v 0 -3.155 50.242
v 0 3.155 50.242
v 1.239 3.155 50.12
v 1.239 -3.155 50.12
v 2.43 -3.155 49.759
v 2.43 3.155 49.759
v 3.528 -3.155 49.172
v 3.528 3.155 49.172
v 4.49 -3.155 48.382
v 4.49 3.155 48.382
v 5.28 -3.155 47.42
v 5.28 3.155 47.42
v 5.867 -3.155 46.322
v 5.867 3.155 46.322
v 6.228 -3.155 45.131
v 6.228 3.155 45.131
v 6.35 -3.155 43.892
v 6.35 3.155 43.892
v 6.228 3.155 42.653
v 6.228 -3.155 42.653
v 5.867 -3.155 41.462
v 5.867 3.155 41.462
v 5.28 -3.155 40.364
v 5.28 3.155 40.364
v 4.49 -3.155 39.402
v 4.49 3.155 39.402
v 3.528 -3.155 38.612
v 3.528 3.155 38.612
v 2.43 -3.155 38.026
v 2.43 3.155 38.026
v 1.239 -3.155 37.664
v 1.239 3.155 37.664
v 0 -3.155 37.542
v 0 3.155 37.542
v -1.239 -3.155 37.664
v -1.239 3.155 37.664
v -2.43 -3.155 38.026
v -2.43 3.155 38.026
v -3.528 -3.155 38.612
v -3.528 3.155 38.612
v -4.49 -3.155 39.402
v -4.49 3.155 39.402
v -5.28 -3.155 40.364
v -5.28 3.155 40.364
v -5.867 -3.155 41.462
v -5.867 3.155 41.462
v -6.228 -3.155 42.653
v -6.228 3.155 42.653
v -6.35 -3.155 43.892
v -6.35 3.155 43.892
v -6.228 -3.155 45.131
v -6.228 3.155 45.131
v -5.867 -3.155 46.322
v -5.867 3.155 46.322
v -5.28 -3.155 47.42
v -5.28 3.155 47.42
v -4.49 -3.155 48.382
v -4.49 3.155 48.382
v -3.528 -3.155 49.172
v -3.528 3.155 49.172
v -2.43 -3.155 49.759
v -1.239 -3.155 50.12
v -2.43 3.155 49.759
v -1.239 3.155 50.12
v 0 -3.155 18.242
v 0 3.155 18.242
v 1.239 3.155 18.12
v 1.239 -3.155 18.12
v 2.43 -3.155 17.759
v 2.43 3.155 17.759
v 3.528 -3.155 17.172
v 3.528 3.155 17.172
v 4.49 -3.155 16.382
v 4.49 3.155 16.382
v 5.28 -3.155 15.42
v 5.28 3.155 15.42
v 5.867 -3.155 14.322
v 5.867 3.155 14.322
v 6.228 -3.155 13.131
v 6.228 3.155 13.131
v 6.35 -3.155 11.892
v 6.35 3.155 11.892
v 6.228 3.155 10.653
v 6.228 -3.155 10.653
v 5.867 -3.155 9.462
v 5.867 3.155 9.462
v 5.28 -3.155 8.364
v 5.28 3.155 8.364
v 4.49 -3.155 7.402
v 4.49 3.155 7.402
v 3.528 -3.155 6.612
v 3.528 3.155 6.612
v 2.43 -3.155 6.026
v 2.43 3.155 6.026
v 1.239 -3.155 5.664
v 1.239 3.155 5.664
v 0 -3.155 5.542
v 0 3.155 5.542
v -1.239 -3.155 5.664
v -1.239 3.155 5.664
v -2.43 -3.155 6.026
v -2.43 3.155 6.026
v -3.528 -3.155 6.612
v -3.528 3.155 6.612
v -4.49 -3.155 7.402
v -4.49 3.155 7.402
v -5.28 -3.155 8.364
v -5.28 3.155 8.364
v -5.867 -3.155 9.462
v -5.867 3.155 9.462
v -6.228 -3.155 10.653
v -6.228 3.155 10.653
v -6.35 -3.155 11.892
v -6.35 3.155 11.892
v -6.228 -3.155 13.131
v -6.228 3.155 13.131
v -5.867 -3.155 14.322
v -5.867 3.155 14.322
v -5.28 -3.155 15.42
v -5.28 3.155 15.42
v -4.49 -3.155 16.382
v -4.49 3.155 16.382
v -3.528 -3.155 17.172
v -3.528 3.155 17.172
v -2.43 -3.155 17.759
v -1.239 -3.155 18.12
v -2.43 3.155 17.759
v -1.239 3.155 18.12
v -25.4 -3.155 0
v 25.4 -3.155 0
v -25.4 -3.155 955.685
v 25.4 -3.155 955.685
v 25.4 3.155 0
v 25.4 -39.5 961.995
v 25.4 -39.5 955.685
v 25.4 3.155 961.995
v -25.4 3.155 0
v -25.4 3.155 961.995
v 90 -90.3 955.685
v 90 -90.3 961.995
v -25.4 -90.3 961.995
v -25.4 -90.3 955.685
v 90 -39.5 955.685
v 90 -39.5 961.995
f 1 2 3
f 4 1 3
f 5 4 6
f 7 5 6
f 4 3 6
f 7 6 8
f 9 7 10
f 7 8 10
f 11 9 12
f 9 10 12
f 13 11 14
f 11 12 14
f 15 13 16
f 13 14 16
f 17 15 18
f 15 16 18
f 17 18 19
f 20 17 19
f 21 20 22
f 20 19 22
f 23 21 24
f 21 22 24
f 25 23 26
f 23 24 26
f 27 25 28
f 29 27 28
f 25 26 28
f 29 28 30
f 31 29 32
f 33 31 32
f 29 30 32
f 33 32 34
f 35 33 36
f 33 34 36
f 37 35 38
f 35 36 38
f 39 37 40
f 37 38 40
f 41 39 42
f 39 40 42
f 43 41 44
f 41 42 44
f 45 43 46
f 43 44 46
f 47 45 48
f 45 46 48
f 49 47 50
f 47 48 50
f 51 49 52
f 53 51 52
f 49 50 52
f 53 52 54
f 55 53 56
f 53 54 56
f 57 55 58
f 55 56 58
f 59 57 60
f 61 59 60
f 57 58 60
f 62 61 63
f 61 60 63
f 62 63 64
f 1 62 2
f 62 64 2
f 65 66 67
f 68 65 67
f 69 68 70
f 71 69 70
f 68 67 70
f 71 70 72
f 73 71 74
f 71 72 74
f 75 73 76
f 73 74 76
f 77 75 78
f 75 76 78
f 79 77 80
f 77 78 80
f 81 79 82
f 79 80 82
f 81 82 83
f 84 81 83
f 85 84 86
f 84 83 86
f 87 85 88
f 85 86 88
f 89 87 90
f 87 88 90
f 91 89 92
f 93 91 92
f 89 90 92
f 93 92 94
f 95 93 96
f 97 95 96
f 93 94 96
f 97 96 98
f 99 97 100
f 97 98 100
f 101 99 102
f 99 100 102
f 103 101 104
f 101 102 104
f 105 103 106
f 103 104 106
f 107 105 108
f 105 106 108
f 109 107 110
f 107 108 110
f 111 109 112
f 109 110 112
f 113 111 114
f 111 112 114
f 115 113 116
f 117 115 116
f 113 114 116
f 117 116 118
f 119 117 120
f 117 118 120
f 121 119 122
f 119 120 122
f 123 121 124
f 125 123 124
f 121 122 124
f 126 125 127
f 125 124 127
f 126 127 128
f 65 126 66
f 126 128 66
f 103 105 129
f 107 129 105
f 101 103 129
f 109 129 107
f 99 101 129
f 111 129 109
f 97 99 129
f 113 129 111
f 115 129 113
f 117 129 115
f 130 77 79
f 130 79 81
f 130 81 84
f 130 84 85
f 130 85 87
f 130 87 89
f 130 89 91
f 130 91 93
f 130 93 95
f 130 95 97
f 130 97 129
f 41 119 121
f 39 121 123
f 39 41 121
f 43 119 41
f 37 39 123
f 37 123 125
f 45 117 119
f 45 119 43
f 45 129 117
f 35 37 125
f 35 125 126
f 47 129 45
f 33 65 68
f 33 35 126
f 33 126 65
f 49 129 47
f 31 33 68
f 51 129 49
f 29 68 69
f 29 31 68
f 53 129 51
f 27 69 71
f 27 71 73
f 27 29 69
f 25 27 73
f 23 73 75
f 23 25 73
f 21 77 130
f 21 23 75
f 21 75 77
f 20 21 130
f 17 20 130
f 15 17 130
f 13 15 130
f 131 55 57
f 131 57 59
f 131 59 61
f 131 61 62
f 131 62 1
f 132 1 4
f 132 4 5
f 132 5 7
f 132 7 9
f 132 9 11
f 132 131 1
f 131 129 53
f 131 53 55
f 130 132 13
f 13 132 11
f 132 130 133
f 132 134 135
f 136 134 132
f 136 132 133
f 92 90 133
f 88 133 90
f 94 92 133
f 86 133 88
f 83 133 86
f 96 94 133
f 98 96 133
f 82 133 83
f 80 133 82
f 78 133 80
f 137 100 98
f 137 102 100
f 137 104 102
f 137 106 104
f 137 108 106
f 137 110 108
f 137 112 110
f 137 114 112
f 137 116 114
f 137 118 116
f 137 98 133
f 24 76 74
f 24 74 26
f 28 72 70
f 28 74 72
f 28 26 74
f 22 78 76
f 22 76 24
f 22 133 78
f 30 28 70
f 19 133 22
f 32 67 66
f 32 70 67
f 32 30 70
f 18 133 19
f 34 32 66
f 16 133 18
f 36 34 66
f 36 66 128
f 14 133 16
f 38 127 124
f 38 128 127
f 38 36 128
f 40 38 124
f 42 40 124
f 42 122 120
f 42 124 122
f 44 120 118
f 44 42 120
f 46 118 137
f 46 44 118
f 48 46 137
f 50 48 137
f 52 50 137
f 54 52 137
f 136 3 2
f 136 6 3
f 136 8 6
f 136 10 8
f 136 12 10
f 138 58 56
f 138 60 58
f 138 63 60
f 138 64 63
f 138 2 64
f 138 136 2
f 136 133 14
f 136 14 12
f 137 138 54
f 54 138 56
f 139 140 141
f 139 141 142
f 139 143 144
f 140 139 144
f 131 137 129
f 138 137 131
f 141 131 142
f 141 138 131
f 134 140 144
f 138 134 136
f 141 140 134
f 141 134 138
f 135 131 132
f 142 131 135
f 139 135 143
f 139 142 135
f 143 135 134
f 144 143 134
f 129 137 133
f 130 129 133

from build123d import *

# Parameters (mm, degrees)
CROQUIS1_W            = 50.8
CROQUIS1_H            = 6.31
CROQUIS2_R            = 6.35
CORTAR_EXTRUIR1_DEPTH = 6.31


with BuildPart() as part:
    # Barrer1: sweep along a curve in space
    with BuildLine() as barrer1_path:
        Line((0, 0, 0), (0, 0, 958.84))
        Line((0, 0, 958.84), (0, -64.9, 958.84))
        Line((0, -64.9, 958.84), (90, -64.9, 958.84))
    # Croquis1 → Barrer1 (sweep)
    with BuildSketch(Plane.XY):
        Rectangle(CROQUIS1_W, CROQUIS1_H)
    sweep(path=barrer1_path.line, transition=Transition.RIGHT)

    # Croquis2 → Cortar-Extruir1 (cut)
    with BuildSketch(Plane(origin=(0, 3.155, 0), x_dir=(1, 0, 0), z_dir=(0, 1, 0))):
        with Locations(Location((0, -43.892204666, 0), (0, 0, 270))):
            Circle(CROQUIS2_R)
        with Locations(Location((0, -11.892204666, 0), (0, 0, 270))):
            Circle(CROQUIS2_R)
    extrude(amount=-CORTAR_EXTRUIR1_DEPTH, mode=Mode.SUBTRACT)


solid = part.part
